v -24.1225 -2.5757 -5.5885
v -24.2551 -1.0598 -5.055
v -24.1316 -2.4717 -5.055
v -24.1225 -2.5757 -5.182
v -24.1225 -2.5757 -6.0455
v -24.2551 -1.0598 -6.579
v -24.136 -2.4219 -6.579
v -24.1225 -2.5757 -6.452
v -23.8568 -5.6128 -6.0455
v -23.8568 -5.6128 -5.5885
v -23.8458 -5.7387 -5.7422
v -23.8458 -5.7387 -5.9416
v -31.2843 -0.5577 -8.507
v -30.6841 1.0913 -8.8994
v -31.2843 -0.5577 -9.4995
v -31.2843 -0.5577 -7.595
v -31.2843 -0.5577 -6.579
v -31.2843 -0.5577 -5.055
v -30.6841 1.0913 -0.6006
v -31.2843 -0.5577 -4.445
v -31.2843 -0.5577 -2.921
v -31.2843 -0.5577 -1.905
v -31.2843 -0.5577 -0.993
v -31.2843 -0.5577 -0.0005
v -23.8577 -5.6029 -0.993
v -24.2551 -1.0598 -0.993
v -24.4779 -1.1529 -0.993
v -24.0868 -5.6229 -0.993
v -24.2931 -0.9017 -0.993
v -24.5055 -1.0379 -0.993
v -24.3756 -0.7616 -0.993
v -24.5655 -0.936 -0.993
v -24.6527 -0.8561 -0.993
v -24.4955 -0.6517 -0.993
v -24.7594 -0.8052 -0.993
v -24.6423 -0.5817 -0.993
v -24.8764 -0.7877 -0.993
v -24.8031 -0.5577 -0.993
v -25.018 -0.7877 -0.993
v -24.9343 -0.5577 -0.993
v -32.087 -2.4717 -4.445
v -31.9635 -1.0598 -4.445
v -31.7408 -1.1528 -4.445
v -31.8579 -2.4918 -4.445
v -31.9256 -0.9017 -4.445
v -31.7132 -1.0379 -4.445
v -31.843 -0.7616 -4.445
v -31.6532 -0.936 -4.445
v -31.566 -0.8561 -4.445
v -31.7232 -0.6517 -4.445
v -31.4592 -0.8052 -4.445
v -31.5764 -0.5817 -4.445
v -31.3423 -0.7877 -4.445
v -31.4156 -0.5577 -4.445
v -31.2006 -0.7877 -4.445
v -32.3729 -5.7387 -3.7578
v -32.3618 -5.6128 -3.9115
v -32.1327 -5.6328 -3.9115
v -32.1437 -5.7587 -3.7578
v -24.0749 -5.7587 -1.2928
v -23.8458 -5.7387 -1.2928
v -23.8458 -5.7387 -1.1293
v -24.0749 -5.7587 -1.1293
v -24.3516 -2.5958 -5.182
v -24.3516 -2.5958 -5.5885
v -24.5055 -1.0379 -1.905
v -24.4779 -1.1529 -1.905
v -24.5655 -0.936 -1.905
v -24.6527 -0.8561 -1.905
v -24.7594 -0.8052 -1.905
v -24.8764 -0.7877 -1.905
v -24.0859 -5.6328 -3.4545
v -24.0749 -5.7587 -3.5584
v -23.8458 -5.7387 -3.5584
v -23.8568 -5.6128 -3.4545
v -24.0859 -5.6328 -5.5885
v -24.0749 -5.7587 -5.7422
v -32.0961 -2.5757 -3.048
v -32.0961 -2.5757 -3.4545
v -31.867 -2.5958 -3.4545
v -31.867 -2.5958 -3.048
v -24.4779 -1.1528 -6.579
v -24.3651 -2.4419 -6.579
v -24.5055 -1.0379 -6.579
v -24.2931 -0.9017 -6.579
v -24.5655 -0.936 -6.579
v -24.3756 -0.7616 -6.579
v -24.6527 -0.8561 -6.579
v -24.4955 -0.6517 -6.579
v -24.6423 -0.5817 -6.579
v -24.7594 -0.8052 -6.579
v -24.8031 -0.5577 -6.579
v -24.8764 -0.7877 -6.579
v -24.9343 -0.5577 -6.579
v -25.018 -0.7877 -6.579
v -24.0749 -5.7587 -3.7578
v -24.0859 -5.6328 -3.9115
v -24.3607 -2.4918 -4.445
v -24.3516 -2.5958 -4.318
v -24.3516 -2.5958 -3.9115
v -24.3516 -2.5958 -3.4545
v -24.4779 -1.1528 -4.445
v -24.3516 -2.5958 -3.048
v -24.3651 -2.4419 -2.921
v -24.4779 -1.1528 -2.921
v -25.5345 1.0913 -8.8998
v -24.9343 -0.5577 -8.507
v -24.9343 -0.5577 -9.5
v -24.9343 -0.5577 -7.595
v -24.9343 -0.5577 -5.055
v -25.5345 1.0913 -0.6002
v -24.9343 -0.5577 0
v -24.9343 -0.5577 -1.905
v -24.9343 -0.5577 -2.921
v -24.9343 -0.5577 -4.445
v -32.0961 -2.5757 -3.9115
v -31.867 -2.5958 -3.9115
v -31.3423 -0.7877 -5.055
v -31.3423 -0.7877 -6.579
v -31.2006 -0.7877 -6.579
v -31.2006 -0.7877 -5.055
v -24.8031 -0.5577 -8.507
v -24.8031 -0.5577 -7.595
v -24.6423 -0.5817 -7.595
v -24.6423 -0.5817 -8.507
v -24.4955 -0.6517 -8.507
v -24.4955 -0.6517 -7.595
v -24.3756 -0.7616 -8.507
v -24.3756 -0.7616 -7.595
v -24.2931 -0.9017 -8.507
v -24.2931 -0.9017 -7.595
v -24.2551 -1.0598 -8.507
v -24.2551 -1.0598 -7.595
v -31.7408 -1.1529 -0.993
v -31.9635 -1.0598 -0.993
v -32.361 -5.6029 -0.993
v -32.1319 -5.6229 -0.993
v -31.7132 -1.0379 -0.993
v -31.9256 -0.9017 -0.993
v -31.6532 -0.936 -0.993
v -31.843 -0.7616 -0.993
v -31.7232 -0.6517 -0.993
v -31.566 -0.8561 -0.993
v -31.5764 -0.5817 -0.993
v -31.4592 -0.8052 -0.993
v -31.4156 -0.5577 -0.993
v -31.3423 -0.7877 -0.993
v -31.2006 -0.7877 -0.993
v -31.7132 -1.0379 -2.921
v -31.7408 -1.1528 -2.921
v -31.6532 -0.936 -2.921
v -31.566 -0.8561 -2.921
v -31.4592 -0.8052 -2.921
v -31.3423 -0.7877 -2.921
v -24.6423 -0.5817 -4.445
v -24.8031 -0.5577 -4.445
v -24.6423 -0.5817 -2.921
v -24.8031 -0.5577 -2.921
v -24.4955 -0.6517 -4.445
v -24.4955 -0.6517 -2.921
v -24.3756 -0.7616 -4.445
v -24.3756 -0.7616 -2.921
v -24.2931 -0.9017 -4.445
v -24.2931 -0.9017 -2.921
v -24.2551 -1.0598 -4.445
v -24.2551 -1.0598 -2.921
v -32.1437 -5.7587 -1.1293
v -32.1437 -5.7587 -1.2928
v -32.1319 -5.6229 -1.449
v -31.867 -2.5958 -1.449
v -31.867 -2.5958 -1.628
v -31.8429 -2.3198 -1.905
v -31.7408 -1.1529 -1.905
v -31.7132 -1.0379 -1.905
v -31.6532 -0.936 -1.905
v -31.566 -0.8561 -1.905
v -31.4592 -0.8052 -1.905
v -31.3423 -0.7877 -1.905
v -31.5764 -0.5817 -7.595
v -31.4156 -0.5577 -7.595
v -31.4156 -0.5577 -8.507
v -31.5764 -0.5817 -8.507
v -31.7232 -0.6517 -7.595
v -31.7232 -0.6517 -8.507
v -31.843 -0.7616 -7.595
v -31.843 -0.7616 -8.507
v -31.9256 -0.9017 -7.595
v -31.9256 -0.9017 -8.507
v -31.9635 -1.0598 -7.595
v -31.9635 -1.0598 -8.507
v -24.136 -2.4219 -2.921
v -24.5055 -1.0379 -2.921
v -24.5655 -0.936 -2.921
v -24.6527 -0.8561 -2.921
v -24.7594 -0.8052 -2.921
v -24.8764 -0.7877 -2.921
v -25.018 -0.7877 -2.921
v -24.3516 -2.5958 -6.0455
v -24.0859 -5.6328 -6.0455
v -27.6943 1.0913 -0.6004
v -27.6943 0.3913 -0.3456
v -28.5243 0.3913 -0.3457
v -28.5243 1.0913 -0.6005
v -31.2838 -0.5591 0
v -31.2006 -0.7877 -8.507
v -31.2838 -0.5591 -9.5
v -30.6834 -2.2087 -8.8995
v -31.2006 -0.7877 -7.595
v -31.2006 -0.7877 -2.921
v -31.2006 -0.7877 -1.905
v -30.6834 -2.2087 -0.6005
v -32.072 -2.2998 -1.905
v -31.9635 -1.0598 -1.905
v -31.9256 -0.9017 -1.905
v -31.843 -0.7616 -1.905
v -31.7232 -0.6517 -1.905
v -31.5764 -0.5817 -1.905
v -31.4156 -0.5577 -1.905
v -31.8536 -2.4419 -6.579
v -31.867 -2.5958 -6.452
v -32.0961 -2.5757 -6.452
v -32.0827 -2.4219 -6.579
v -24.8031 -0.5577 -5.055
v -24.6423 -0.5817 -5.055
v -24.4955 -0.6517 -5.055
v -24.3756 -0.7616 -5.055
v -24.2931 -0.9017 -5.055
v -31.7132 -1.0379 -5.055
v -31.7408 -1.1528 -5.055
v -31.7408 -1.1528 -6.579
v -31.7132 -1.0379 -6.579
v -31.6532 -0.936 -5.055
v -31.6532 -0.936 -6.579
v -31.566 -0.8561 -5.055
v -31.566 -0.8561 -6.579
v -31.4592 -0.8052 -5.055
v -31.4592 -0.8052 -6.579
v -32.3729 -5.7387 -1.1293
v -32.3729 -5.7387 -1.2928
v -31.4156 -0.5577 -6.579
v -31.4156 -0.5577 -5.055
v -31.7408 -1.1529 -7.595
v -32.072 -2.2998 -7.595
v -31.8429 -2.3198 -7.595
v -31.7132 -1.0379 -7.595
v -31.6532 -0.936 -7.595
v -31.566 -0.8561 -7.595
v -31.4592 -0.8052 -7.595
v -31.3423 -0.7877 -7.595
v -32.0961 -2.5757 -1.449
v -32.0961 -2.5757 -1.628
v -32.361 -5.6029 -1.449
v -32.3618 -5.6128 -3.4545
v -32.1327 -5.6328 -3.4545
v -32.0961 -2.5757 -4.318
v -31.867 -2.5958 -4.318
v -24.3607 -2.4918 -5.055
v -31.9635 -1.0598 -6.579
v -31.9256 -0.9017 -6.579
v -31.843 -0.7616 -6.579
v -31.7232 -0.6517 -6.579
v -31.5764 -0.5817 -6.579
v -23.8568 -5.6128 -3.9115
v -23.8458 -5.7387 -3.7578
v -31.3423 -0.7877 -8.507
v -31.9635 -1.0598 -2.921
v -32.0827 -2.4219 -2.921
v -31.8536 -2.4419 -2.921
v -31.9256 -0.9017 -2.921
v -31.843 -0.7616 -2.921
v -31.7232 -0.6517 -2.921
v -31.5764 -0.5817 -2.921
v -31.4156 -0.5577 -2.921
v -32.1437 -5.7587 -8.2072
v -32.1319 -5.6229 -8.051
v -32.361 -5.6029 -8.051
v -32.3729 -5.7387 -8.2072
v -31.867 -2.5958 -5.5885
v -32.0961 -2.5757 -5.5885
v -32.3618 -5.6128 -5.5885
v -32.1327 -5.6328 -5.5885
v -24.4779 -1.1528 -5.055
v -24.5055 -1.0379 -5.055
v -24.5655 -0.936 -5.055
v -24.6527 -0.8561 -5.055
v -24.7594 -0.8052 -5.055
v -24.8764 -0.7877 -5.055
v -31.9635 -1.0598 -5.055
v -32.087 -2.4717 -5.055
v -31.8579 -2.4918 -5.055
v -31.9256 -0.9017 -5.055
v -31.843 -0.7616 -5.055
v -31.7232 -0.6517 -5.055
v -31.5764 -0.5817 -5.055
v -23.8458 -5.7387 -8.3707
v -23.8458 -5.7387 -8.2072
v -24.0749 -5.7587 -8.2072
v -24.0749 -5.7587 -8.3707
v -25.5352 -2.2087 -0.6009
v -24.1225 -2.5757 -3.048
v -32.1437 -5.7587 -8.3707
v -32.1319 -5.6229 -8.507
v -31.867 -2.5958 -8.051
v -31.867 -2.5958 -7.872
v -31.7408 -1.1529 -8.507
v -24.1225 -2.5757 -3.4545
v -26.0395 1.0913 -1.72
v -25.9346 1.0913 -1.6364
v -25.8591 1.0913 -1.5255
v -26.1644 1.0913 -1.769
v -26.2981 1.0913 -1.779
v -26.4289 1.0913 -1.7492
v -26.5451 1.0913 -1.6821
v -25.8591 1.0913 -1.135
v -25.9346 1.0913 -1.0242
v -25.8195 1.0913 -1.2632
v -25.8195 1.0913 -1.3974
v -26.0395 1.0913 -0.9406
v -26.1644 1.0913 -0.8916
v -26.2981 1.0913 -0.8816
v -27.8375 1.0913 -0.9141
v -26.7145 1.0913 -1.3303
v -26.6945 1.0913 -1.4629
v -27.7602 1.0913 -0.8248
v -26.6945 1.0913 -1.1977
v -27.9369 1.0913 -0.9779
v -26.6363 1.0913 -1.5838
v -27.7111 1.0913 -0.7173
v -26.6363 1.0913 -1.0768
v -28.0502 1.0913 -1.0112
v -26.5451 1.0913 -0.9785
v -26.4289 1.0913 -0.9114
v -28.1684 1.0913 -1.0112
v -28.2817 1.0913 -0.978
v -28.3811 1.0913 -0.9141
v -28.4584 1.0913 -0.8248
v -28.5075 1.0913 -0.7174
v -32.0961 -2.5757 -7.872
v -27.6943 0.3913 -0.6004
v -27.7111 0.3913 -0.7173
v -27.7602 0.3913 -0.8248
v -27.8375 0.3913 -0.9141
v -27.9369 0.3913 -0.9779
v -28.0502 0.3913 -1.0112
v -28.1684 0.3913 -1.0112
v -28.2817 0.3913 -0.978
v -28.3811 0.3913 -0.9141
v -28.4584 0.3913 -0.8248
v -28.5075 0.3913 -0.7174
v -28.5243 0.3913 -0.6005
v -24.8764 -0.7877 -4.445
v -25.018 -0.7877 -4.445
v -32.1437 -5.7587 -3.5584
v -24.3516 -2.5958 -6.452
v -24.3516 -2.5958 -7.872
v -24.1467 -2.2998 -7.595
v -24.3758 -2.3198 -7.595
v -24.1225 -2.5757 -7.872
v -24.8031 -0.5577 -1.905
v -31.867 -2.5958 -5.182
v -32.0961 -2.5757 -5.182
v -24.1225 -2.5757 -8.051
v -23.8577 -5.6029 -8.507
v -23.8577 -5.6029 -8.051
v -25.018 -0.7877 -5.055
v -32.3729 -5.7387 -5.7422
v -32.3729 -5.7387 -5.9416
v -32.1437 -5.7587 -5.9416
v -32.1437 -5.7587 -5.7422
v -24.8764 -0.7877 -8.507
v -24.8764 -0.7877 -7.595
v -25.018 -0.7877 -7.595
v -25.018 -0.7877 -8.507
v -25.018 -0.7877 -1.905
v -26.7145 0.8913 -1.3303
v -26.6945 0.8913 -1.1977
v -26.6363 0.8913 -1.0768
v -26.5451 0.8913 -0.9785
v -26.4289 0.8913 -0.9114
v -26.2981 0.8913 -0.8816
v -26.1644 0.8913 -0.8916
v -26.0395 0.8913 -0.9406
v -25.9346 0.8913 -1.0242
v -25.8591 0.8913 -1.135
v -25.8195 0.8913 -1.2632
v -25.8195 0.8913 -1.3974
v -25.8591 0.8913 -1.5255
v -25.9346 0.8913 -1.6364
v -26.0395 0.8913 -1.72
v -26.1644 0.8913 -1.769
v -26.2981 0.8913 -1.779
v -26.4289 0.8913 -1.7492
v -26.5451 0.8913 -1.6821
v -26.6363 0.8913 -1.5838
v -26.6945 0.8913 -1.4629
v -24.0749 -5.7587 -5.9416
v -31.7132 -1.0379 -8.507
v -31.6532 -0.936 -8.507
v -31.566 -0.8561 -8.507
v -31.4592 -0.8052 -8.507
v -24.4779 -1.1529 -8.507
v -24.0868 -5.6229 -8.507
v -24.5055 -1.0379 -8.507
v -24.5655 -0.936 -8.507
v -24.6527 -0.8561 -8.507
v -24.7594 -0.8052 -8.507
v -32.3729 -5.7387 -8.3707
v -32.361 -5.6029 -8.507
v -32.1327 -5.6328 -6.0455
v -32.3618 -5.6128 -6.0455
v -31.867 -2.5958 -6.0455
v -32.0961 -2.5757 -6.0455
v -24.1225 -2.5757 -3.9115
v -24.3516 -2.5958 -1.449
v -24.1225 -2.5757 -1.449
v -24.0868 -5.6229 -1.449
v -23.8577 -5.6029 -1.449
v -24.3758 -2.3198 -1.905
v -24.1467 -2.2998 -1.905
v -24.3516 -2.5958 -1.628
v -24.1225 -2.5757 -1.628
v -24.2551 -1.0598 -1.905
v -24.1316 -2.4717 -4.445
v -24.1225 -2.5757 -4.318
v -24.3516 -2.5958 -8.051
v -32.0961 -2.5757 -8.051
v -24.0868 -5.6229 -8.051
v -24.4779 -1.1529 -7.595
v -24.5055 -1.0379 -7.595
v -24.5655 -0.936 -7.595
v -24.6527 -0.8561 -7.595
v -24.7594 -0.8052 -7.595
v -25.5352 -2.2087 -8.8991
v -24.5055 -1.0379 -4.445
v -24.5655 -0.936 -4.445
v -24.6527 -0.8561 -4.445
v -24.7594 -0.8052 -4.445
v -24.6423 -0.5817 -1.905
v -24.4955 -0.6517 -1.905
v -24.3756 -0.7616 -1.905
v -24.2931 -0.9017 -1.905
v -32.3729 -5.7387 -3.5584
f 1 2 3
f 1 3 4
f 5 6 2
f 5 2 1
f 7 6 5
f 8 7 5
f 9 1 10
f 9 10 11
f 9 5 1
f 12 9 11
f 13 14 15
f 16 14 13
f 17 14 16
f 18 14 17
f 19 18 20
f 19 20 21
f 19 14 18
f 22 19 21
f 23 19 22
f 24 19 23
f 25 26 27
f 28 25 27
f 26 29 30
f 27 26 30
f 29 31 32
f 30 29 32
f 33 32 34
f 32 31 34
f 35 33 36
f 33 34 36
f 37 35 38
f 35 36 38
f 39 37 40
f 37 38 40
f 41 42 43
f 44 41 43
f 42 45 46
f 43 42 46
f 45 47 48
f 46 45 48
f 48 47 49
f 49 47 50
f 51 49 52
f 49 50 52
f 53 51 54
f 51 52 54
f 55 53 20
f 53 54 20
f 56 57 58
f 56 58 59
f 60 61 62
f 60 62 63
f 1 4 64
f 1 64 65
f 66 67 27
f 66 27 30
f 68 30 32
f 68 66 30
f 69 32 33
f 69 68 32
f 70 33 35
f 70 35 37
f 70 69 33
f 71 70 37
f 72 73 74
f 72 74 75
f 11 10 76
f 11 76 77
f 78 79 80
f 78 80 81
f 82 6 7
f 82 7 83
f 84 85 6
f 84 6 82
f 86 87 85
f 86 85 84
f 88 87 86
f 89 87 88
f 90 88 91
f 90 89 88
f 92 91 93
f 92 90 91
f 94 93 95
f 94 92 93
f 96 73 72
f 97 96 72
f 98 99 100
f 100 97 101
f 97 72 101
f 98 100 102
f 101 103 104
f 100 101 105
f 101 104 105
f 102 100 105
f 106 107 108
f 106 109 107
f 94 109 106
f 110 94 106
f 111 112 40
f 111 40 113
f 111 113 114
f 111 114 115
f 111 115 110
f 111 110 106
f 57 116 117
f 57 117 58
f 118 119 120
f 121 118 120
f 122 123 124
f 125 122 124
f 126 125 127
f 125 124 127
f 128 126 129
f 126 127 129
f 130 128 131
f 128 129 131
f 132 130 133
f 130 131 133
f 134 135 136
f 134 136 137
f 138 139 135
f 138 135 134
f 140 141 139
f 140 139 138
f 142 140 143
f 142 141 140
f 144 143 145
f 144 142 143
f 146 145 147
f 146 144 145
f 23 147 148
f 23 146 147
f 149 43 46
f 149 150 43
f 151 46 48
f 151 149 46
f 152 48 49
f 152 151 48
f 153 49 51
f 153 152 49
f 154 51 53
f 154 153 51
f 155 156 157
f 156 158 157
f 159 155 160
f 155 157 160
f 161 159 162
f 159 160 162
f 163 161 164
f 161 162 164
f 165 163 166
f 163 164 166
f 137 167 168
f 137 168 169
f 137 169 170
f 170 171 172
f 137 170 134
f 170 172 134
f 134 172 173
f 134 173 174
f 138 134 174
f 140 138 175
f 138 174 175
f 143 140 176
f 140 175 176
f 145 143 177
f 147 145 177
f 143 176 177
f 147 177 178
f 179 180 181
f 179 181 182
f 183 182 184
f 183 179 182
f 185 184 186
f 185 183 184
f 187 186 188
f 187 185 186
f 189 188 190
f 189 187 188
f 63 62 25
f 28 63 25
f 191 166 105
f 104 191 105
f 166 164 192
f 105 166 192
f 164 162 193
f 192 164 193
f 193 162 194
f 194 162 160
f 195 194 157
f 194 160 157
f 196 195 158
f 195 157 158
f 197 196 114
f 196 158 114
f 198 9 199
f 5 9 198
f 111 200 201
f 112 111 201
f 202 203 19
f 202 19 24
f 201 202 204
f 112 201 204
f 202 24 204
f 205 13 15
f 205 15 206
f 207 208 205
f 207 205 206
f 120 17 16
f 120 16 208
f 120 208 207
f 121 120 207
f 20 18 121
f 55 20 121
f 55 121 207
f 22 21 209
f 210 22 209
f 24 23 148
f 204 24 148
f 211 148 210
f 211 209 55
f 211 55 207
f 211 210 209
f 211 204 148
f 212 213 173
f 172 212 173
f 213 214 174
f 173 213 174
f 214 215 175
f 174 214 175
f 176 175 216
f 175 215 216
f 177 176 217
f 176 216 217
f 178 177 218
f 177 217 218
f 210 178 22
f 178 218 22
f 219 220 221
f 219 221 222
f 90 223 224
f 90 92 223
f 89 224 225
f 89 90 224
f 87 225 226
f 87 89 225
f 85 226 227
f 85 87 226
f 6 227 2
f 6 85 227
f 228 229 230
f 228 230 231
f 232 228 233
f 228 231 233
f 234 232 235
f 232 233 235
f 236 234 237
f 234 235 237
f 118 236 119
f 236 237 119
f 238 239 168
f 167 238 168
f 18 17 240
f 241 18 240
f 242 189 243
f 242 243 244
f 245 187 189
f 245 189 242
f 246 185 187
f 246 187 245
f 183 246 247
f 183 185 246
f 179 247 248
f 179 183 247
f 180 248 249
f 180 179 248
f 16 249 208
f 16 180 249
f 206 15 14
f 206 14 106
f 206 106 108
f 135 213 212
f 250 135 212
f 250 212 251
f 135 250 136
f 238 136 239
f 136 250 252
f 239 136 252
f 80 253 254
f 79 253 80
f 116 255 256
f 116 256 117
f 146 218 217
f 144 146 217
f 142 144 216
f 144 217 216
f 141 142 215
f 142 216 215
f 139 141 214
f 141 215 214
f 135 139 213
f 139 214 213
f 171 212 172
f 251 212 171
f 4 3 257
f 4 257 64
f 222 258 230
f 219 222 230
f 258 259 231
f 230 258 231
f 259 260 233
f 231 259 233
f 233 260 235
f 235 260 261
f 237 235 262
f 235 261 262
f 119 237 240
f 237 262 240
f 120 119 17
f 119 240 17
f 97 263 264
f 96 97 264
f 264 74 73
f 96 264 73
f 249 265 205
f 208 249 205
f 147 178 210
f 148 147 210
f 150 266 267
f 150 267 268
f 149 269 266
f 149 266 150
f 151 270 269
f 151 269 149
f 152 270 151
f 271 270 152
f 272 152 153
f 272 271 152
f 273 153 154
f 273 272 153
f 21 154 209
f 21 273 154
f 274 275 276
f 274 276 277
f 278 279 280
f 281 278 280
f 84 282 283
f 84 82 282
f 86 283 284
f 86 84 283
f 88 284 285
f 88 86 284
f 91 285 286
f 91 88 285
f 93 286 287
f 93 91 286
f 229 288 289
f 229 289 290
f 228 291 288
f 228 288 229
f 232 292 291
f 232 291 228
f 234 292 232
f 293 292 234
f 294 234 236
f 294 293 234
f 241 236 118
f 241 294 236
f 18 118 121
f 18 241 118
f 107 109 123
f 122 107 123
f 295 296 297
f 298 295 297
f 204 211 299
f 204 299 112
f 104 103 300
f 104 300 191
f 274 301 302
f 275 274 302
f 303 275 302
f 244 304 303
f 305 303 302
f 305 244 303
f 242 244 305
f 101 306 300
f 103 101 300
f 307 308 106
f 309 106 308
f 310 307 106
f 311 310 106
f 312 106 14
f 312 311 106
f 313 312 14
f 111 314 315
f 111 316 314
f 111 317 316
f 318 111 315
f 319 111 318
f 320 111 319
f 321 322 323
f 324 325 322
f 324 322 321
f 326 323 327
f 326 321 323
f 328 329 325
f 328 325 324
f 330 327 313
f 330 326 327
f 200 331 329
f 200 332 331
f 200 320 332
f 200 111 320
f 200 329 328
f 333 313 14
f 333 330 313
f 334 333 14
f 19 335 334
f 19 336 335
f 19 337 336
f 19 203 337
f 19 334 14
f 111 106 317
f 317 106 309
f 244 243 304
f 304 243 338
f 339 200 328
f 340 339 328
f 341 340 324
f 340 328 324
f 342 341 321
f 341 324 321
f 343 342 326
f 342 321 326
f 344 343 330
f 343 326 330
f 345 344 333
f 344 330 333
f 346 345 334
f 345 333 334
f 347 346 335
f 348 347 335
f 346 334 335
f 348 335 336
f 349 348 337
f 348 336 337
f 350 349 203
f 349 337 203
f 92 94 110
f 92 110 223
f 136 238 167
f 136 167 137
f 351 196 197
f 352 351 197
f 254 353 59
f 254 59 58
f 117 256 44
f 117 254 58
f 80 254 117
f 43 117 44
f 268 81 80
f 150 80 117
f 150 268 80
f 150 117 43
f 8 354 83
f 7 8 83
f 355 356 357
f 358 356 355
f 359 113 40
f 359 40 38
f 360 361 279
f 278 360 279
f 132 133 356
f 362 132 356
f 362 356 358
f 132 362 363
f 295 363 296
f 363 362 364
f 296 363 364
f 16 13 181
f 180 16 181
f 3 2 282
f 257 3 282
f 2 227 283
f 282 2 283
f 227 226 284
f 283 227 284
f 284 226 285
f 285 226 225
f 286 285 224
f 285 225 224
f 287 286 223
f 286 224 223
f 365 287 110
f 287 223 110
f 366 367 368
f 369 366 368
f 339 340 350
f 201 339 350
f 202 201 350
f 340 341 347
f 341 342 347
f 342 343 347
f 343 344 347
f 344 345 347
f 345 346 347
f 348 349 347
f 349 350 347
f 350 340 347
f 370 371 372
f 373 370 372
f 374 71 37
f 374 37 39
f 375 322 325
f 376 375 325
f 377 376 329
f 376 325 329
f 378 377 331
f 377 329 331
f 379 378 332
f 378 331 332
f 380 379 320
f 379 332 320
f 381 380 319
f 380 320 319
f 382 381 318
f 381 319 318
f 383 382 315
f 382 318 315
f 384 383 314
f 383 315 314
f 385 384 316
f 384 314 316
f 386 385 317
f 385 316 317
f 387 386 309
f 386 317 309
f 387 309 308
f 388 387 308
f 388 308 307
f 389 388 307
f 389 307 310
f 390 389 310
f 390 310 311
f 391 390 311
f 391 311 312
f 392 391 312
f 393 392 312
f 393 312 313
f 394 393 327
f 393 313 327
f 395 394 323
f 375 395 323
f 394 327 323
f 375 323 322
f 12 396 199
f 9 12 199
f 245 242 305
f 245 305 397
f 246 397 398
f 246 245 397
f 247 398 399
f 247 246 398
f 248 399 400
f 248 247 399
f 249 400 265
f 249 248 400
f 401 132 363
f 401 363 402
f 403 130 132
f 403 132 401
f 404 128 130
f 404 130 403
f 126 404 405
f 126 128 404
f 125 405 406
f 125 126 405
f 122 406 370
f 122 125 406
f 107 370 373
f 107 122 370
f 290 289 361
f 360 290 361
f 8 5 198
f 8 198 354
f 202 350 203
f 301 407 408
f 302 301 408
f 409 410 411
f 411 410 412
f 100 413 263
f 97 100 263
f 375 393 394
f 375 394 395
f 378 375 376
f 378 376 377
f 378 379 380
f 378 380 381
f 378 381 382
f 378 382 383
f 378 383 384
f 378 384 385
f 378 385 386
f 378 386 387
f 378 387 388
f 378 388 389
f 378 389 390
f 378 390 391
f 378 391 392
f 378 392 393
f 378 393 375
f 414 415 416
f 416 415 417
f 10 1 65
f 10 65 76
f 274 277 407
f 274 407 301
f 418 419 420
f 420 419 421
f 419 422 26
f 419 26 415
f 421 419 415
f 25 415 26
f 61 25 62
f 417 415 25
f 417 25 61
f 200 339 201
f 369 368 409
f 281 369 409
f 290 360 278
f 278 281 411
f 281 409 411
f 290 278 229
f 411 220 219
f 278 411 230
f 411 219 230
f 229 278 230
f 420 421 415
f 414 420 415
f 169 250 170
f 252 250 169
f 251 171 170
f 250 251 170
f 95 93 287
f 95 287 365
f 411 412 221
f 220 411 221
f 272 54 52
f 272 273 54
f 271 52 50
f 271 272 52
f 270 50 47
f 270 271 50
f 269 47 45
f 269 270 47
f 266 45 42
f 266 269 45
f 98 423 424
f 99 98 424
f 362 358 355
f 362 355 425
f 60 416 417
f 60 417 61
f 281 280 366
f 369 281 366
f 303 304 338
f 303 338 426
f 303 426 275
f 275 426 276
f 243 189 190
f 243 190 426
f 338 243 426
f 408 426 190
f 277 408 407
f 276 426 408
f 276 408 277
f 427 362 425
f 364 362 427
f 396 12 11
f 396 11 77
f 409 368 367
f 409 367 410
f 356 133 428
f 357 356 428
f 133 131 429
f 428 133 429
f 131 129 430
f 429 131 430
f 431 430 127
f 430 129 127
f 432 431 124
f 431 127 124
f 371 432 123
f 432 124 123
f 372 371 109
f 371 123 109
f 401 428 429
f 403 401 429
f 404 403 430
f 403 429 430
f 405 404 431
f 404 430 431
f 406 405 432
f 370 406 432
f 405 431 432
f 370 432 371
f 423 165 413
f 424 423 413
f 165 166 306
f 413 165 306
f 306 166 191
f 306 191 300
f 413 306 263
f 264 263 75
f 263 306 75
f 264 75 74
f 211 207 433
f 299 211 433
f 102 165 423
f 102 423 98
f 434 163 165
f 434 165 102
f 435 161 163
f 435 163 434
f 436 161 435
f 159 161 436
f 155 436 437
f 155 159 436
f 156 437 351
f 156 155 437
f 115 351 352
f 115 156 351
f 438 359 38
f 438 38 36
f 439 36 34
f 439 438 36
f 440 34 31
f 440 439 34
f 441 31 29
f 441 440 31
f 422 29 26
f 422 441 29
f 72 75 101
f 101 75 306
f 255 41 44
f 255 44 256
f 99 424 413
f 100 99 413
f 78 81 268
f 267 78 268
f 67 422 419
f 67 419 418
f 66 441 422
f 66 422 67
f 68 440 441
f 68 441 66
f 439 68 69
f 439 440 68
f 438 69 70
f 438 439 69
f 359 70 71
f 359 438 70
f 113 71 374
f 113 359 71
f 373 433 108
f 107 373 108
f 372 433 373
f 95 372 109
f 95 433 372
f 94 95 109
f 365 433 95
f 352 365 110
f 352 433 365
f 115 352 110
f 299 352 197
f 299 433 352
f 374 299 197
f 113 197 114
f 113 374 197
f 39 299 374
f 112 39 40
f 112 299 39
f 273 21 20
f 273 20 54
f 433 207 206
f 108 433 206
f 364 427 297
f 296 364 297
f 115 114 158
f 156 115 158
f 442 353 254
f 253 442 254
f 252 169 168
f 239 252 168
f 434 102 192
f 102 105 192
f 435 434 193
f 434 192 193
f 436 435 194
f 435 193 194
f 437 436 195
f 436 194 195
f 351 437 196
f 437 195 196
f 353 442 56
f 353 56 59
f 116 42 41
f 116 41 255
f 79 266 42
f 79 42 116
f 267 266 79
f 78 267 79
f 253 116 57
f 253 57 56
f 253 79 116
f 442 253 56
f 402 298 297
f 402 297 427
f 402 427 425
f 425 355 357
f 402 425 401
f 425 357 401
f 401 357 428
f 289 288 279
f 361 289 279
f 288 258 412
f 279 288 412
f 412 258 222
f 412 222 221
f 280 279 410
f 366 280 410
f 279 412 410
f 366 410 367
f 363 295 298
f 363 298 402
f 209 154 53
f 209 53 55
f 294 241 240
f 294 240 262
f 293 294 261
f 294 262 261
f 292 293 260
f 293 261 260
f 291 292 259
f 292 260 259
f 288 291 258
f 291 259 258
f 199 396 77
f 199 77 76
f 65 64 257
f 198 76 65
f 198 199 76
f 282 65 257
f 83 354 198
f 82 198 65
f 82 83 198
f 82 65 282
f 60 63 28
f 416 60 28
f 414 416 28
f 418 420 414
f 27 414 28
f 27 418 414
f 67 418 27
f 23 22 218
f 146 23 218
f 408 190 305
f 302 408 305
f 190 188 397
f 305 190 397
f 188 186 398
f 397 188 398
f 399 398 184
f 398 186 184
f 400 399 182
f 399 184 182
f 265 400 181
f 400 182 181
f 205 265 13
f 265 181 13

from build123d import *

# Parameters (mm, degrees)
BOSS_EXTRUDE1_DEPTH     = 9.5
CUT_EXTRUDE2_DEPTH      = 9.5
CUT_EXTRUDE2_DEPTH_BACK = 9.5
CUT_EXTRUDE3_DEPTH      = 0.7
SKETCH4_W               = 0.83
SKETCH4_H               = 0.7
CUT_EXTRUDE4_DEPTH      = 0.7
BOSS_EXTRUDE2_START     = -0.762
BOSS_EXTRUDE2_DEPTH     = 0.912
CUT_EXTRUDE5_DEPTH      = 10.15
SKETCH9_R               = 0.45
CUT_EXTRUDE7_DEPTH      = 0.2
BOSS_EXTRUDE3_DEPTH     = 0.762
CUT_EXTRUDE6_DEPTH      = 0.762
MIRROR2_START           = -0.762
MIRROR2_COPY_1_DEPTH    = 0.912
MIRROR2_COPY_2_DEPTH    = 10.15
MIRROR2_COPY_3_DEPTH    = 0.762
MIRROR2_COPY_4_DEPTH    = 0.762


with BuildPart() as part:
    # Sketch1 → Boss-Extrude1 (new body)
    with BuildSketch(Plane.XY):
        Polygon((-24.934327538, -0.557710036), (-25.534514454, 1.091289964), (-30.684140621, 1.091289964), (-31.284327538, -0.557710036), (-30.683412681, -2.208710036), (-25.535242395, -2.208710036), align=None)
    extrude(amount=-BOSS_EXTRUDE1_DEPTH)

    # Sketch2 → Cut-Extrude2 (cut, two sides)
    with BuildSketch(Plane(origin=(-30.683898403, -0.0067685, 0), x_dir=(0, 0, 1), z_dir=(-0.9999999756704636, -0.00022058801540043594, 0))) as cut_extrude2_sk:
        Polygon((-0.616330332, -2.245563479), (0, -0.552209808), (0, -2.212209808), align=None)
        Polygon((-0.60064854, 1.098058491), (0, -0.552209808), (0, 1.098058491), align=None)
        Polygon((-9.5, -2.212209808), (-8.892247033, -2.221997362), (-9.5, -0.552209808), align=None)
        Polygon((-9.5, -0.552209808), (-9.5, 1.098058491), (-8.89935146, 1.098058491), align=None)
    extrude(amount=CUT_EXTRUDE2_DEPTH, mode=Mode.SUBTRACT)
    extrude(cut_extrude2_sk.sketch, amount=-CUT_EXTRUDE2_DEPTH_BACK, mode=Mode.SUBTRACT)

    # Sketch3 → Cut-Extrude3 (cut)
    with BuildSketch(Plane(origin=(0, 1.091289964, 0), x_dir=(1, 0, 0), z_dir=(0, 1, 0))):
        with BuildLine():
            Line((-28.524327536, 0.600475134), (-27.694327539, 0.600408495))
            ThreePointArc((-27.694327539, 0.600408495), (-28.109294218, 1.015441813), (-28.524327536, 0.600475134))
        make_face()
    extrude(amount=-CUT_EXTRUDE3_DEPTH, mode=Mode.SUBTRACT)

    # Sketch4 → Cut-Extrude4 (cut)
    with BuildSketch(Plane(origin=(4.8027e-05, 0, -0.598184984), x_dir=(-0.9999999967769609, 0, -8.028747138262029e-05), z_dir=(8.028747138262029e-05, 0, -0.9999999967769609))):
        with Locations((28.109375655, 0.741289964)):
            Rectangle(SKETCH4_W, SKETCH4_H)
    extrude(amount=-CUT_EXTRUDE4_DEPTH, mode=Mode.SUBTRACT)


with BuildPart() as boss_extrude2_tool:
    # Sketch5 → Boss-Extrude2 (new body)
    with BuildSketch(Plane.XY.offset(-1.143).offset(BOSS_EXTRUDE2_START)):
        with BuildLine():
            Line((-24.934327536, -0.557713614), (-24.80305479, -0.557713614))
            ThreePointArc((-24.80305479, -0.557713614), (-24.431480176, -0.702211079), (-24.255147706, -1.059777956))
            Line((-24.255147706, -1.059777956), (-23.8457982, -5.738664215))
            Line((-23.8457982, -5.738664215), (-24.074922981, -5.758710036))
            Line((-24.074922981, -5.758710036), (-24.477883405, -1.152851317))
            ThreePointArc((-24.477883405, -1.152851317), (-24.606125201, -0.892802679), (-24.876361284, -0.787713614))
            Line((-24.876361284, -0.787713614), (-25.018040872, -0.787713614))
            Line((-25.018040872, -0.787713614), (-24.934327536, -0.557713614))
        make_face()
    boss_extrude2 = extrude(amount=BOSS_EXTRUDE2_DEPTH)


with BuildPart() as part_1:
    add(part.part)


with BuildPart() as part_2:
    # Boss-Extrude2: joined with boss_extrude2_tool
    add(part_1.part.fuse(boss_extrude2_tool.part, tol=0.00001))

    # Sketch6 → Cut-Extrude5 (cut)
    with BuildSketch(Plane(origin=(-24.162916864, -2.113981303, 0), x_dir=(0, 0, -1), z_dir=(0.9961946980917458, 0.08715574274765556, 0))):
        Polygon((0.993, -3.502234692), (0.993, -3.638528611), (1.129293919, -3.638528611), align=None)
        Polygon((1.449, -3.502234692), (1.292810168, -3.638528611), (1.449, -3.638528611), align=None)
        Polygon((1.449, -3.502234692), (1.449, -3.638528611), (1.905, -3.638528611), (1.905, -0.186528611), (1.628, -0.463528611), (1.449, -0.463528611), align=None)
    cut_extrude5 = extrude(amount=-CUT_EXTRUDE5_DEPTH, mode=Mode.SUBTRACT)

    # Sketch9 → Cut-Extrude7 (cut)
    with BuildSketch(Plane(origin=(0, 1.091289964, 0), x_dir=(1, 0, 0), z_dir=(0, 1, 0))):
        with Locations(Location((-26.264514454, 1.330293701, 0), (0, 0, 180))):
            Circle(SKETCH9_R)
    extrude(amount=-CUT_EXTRUDE7_DEPTH, mode=Mode.SUBTRACT)

    # Sketch7 → Boss-Extrude3 (add, symmetric)
    with BuildSketch(Plane.XY.offset(-3.683)):
        with BuildLine():
            Line((-24.934327538, -0.557710036), (-24.803054792, -0.557710036))
            ThreePointArc((-24.803054792, -0.557710036), (-24.431480177, -0.7022075), (-24.255147708, -1.059774377))
            Line((-24.255147708, -1.059774377), (-23.845798202, -5.738660636))
            Line((-23.845798202, -5.738660636), (-24.074922983, -5.758706457))
            Line((-24.074922983, -5.758706457), (-24.477883406, -1.152847739))
            ThreePointArc((-24.477883406, -1.152847739), (-24.606125202, -0.892799101), (-24.876361286, -0.787710036))
            Line((-24.876361286, -0.787710036), (-25.018040873, -0.787710036))
            Line((-25.018040873, -0.787710036), (-24.934327538, -0.557710036))
        make_face()
    boss_extrude3 = extrude(amount=BOSS_EXTRUDE3_DEPTH, both=True)

    # Sketch8 → Cut-Extrude6 (cut)
    with BuildSketch(Plane(origin=(-24.162916555, -2.113981276, 0), x_dir=(0, 0, -1), z_dir=(0.9961946980917459, 0.08715574274765502, 0))):
        Polygon((2.921, -3.638525046), (3.4545, -3.638525046), (3.4545, -3.512139824), (3.4545, -0.463528611), (3.048, -0.463528611), (2.921, -0.309075706), align=None)
        Polygon((3.9115, -0.463528611), (3.9115, -3.512139824), (3.9115, -3.638525046), (4.445, -3.638525046), (4.445, -0.359101958), (4.318, -0.463528611), align=None)
        Polygon((3.4545, -3.512139824), (3.4545, -3.638525046), (3.558421148, -3.638525046), align=None)
        Polygon((3.9115, -3.512139824), (3.757794765, -3.638525046), (3.9115, -3.638525046), align=None)
    cut_extrude6 = extrude(amount=-CUT_EXTRUDE6_DEPTH, mode=Mode.SUBTRACT)

    # Mirror1: Boss-Extrude2, Cut-Extrude5, Boss-Extrude3, Cut-Extrude6 across plane
    add(boss_extrude2.mirror(Plane.XY.offset(-4.75)))
    add(cut_extrude5.mirror(Plane.XY.offset(-4.75)), mode=Mode.SUBTRACT)
    add(boss_extrude3.mirror(Plane.XY.offset(-4.75)))
    add(cut_extrude6.mirror(Plane.XY.offset(-4.75)), mode=Mode.SUBTRACT)

    # Mirror2: Boss-Extrude2, Cut-Extrude5, Boss-Extrude3, Cut-Extrude6 across plane
    add(boss_extrude2.mirror(Plane(origin=(-28.109327538, 0, 0), x_dir=(0, 0, 1), z_dir=(1, 0, 0))))
    add(cut_extrude5.mirror(Plane(origin=(-28.109327538, 0, 0), x_dir=(0, 0, 1), z_dir=(1, 0, 0))), mode=Mode.SUBTRACT)
    add(boss_extrude3.mirror(Plane(origin=(-28.109327538, 0, 0), x_dir=(0, 0, 1), z_dir=(1, 0, 0))))
    add(cut_extrude6.mirror(Plane(origin=(-28.109327538, 0, 0), x_dir=(0, 0, 1), z_dir=(1, 0, 0))), mode=Mode.SUBTRACT)


with BuildPart() as mirror2_copy_1_tool:
    # Mirror2 copy 1 sketch → Mirror2 copy 1 (new body)
    with BuildSketch(Plane(origin=(-56.218655076, 0, -8.357), x_dir=(-1, 0, 0), z_dir=(0, 0, -1)).offset(MIRROR2_START)):
        with BuildLine():
            Line((-24.934327536, -0.557713614), (-24.80305479, -0.557713614))
            ThreePointArc((-24.80305479, -0.557713614), (-24.431480176, -0.702211079), (-24.255147706, -1.059777956))
            Line((-24.255147706, -1.059777956), (-23.8457982, -5.738664215))
            Line((-23.8457982, -5.738664215), (-24.074922981, -5.758710036))
            Line((-24.074922981, -5.758710036), (-24.477883405, -1.152851317))
            ThreePointArc((-24.477883405, -1.152851317), (-24.606125201, -0.892802679), (-24.876361284, -0.787713614))
            Line((-24.876361284, -0.787713614), (-25.018040872, -0.787713614))
            Line((-25.018040872, -0.787713614), (-24.934327536, -0.557713614))
        make_face()
    extrude(amount=MIRROR2_COPY_1_DEPTH)


with BuildPart() as part_3:
    add(part_2.part)


with BuildPart() as part_4:
    # Mirror2 copy 1: joined with mirror2_copy_1_tool
    add(part_3.part.fuse(mirror2_copy_1_tool.part, tol=0.00001))

    # Mirror2 copy 2 sketch → Mirror2 copy 2 (cut)
    with BuildSketch(Plane(origin=(-32.055738211, -2.113981303, -9.5), x_dir=(0, 0, 1), z_dir=(-0.9961946980917458, 0.08715574274765556, 0))):
        Polygon((0.993, -3.502234692), (0.993, -3.638528611), (1.129293919, -3.638528611), align=None)
        Polygon((1.449, -3.502234692), (1.292810168, -3.638528611), (1.449, -3.638528611), align=None)
        Polygon((1.449, -3.502234692), (1.449, -3.638528611), (1.905, -3.638528611), (1.905, -0.186528611), (1.628, -0.463528611), (1.449, -0.463528611), align=None)
    extrude(amount=-MIRROR2_COPY_2_DEPTH, mode=Mode.SUBTRACT)

    # Mirror2 copy 3 sketch → Mirror2 copy 3 (add, symmetric)
    with BuildSketch(Plane(origin=(-56.218655076, 0, -5.817), x_dir=(-1, 0, 0), z_dir=(0, 0, -1))):
        with BuildLine():
            Line((-24.934327538, -0.557710036), (-24.803054792, -0.557710036))
            ThreePointArc((-24.803054792, -0.557710036), (-24.431480177, -0.7022075), (-24.255147708, -1.059774377))
            Line((-24.255147708, -1.059774377), (-23.845798202, -5.738660636))
            Line((-23.845798202, -5.738660636), (-24.074922983, -5.758706457))
            Line((-24.074922983, -5.758706457), (-24.477883406, -1.152847739))
            ThreePointArc((-24.477883406, -1.152847739), (-24.606125202, -0.892799101), (-24.876361286, -0.787710036))
            Line((-24.876361286, -0.787710036), (-25.018040873, -0.787710036))
            Line((-25.018040873, -0.787710036), (-24.934327538, -0.557710036))
        make_face()
    extrude(amount=MIRROR2_COPY_3_DEPTH, both=True)

    # Mirror2 copy 4 sketch → Mirror2 copy 4 (cut)
    with BuildSketch(Plane(origin=(-32.055738521, -2.113981276, -9.5), x_dir=(0, 0, 1), z_dir=(-0.9961946980917459, 0.08715574274765502, 0))):
        Polygon((2.921, -3.638525046), (3.4545, -3.638525046), (3.4545, -3.512139824), (3.4545, -0.463528611), (3.048, -0.463528611), (2.921, -0.309075706), align=None)
        Polygon((3.9115, -0.463528611), (3.9115, -3.512139824), (3.9115, -3.638525046), (4.445, -3.638525046), (4.445, -0.359101958), (4.318, -0.463528611), align=None)
        Polygon((3.4545, -3.512139824), (3.4545, -3.638525046), (3.558421148, -3.638525046), align=None)
        Polygon((3.9115, -3.512139824), (3.757794765, -3.638525046), (3.9115, -3.638525046), align=None)
    extrude(amount=-MIRROR2_COPY_4_DEPTH, mode=Mode.SUBTRACT)


solid = part_4.part
